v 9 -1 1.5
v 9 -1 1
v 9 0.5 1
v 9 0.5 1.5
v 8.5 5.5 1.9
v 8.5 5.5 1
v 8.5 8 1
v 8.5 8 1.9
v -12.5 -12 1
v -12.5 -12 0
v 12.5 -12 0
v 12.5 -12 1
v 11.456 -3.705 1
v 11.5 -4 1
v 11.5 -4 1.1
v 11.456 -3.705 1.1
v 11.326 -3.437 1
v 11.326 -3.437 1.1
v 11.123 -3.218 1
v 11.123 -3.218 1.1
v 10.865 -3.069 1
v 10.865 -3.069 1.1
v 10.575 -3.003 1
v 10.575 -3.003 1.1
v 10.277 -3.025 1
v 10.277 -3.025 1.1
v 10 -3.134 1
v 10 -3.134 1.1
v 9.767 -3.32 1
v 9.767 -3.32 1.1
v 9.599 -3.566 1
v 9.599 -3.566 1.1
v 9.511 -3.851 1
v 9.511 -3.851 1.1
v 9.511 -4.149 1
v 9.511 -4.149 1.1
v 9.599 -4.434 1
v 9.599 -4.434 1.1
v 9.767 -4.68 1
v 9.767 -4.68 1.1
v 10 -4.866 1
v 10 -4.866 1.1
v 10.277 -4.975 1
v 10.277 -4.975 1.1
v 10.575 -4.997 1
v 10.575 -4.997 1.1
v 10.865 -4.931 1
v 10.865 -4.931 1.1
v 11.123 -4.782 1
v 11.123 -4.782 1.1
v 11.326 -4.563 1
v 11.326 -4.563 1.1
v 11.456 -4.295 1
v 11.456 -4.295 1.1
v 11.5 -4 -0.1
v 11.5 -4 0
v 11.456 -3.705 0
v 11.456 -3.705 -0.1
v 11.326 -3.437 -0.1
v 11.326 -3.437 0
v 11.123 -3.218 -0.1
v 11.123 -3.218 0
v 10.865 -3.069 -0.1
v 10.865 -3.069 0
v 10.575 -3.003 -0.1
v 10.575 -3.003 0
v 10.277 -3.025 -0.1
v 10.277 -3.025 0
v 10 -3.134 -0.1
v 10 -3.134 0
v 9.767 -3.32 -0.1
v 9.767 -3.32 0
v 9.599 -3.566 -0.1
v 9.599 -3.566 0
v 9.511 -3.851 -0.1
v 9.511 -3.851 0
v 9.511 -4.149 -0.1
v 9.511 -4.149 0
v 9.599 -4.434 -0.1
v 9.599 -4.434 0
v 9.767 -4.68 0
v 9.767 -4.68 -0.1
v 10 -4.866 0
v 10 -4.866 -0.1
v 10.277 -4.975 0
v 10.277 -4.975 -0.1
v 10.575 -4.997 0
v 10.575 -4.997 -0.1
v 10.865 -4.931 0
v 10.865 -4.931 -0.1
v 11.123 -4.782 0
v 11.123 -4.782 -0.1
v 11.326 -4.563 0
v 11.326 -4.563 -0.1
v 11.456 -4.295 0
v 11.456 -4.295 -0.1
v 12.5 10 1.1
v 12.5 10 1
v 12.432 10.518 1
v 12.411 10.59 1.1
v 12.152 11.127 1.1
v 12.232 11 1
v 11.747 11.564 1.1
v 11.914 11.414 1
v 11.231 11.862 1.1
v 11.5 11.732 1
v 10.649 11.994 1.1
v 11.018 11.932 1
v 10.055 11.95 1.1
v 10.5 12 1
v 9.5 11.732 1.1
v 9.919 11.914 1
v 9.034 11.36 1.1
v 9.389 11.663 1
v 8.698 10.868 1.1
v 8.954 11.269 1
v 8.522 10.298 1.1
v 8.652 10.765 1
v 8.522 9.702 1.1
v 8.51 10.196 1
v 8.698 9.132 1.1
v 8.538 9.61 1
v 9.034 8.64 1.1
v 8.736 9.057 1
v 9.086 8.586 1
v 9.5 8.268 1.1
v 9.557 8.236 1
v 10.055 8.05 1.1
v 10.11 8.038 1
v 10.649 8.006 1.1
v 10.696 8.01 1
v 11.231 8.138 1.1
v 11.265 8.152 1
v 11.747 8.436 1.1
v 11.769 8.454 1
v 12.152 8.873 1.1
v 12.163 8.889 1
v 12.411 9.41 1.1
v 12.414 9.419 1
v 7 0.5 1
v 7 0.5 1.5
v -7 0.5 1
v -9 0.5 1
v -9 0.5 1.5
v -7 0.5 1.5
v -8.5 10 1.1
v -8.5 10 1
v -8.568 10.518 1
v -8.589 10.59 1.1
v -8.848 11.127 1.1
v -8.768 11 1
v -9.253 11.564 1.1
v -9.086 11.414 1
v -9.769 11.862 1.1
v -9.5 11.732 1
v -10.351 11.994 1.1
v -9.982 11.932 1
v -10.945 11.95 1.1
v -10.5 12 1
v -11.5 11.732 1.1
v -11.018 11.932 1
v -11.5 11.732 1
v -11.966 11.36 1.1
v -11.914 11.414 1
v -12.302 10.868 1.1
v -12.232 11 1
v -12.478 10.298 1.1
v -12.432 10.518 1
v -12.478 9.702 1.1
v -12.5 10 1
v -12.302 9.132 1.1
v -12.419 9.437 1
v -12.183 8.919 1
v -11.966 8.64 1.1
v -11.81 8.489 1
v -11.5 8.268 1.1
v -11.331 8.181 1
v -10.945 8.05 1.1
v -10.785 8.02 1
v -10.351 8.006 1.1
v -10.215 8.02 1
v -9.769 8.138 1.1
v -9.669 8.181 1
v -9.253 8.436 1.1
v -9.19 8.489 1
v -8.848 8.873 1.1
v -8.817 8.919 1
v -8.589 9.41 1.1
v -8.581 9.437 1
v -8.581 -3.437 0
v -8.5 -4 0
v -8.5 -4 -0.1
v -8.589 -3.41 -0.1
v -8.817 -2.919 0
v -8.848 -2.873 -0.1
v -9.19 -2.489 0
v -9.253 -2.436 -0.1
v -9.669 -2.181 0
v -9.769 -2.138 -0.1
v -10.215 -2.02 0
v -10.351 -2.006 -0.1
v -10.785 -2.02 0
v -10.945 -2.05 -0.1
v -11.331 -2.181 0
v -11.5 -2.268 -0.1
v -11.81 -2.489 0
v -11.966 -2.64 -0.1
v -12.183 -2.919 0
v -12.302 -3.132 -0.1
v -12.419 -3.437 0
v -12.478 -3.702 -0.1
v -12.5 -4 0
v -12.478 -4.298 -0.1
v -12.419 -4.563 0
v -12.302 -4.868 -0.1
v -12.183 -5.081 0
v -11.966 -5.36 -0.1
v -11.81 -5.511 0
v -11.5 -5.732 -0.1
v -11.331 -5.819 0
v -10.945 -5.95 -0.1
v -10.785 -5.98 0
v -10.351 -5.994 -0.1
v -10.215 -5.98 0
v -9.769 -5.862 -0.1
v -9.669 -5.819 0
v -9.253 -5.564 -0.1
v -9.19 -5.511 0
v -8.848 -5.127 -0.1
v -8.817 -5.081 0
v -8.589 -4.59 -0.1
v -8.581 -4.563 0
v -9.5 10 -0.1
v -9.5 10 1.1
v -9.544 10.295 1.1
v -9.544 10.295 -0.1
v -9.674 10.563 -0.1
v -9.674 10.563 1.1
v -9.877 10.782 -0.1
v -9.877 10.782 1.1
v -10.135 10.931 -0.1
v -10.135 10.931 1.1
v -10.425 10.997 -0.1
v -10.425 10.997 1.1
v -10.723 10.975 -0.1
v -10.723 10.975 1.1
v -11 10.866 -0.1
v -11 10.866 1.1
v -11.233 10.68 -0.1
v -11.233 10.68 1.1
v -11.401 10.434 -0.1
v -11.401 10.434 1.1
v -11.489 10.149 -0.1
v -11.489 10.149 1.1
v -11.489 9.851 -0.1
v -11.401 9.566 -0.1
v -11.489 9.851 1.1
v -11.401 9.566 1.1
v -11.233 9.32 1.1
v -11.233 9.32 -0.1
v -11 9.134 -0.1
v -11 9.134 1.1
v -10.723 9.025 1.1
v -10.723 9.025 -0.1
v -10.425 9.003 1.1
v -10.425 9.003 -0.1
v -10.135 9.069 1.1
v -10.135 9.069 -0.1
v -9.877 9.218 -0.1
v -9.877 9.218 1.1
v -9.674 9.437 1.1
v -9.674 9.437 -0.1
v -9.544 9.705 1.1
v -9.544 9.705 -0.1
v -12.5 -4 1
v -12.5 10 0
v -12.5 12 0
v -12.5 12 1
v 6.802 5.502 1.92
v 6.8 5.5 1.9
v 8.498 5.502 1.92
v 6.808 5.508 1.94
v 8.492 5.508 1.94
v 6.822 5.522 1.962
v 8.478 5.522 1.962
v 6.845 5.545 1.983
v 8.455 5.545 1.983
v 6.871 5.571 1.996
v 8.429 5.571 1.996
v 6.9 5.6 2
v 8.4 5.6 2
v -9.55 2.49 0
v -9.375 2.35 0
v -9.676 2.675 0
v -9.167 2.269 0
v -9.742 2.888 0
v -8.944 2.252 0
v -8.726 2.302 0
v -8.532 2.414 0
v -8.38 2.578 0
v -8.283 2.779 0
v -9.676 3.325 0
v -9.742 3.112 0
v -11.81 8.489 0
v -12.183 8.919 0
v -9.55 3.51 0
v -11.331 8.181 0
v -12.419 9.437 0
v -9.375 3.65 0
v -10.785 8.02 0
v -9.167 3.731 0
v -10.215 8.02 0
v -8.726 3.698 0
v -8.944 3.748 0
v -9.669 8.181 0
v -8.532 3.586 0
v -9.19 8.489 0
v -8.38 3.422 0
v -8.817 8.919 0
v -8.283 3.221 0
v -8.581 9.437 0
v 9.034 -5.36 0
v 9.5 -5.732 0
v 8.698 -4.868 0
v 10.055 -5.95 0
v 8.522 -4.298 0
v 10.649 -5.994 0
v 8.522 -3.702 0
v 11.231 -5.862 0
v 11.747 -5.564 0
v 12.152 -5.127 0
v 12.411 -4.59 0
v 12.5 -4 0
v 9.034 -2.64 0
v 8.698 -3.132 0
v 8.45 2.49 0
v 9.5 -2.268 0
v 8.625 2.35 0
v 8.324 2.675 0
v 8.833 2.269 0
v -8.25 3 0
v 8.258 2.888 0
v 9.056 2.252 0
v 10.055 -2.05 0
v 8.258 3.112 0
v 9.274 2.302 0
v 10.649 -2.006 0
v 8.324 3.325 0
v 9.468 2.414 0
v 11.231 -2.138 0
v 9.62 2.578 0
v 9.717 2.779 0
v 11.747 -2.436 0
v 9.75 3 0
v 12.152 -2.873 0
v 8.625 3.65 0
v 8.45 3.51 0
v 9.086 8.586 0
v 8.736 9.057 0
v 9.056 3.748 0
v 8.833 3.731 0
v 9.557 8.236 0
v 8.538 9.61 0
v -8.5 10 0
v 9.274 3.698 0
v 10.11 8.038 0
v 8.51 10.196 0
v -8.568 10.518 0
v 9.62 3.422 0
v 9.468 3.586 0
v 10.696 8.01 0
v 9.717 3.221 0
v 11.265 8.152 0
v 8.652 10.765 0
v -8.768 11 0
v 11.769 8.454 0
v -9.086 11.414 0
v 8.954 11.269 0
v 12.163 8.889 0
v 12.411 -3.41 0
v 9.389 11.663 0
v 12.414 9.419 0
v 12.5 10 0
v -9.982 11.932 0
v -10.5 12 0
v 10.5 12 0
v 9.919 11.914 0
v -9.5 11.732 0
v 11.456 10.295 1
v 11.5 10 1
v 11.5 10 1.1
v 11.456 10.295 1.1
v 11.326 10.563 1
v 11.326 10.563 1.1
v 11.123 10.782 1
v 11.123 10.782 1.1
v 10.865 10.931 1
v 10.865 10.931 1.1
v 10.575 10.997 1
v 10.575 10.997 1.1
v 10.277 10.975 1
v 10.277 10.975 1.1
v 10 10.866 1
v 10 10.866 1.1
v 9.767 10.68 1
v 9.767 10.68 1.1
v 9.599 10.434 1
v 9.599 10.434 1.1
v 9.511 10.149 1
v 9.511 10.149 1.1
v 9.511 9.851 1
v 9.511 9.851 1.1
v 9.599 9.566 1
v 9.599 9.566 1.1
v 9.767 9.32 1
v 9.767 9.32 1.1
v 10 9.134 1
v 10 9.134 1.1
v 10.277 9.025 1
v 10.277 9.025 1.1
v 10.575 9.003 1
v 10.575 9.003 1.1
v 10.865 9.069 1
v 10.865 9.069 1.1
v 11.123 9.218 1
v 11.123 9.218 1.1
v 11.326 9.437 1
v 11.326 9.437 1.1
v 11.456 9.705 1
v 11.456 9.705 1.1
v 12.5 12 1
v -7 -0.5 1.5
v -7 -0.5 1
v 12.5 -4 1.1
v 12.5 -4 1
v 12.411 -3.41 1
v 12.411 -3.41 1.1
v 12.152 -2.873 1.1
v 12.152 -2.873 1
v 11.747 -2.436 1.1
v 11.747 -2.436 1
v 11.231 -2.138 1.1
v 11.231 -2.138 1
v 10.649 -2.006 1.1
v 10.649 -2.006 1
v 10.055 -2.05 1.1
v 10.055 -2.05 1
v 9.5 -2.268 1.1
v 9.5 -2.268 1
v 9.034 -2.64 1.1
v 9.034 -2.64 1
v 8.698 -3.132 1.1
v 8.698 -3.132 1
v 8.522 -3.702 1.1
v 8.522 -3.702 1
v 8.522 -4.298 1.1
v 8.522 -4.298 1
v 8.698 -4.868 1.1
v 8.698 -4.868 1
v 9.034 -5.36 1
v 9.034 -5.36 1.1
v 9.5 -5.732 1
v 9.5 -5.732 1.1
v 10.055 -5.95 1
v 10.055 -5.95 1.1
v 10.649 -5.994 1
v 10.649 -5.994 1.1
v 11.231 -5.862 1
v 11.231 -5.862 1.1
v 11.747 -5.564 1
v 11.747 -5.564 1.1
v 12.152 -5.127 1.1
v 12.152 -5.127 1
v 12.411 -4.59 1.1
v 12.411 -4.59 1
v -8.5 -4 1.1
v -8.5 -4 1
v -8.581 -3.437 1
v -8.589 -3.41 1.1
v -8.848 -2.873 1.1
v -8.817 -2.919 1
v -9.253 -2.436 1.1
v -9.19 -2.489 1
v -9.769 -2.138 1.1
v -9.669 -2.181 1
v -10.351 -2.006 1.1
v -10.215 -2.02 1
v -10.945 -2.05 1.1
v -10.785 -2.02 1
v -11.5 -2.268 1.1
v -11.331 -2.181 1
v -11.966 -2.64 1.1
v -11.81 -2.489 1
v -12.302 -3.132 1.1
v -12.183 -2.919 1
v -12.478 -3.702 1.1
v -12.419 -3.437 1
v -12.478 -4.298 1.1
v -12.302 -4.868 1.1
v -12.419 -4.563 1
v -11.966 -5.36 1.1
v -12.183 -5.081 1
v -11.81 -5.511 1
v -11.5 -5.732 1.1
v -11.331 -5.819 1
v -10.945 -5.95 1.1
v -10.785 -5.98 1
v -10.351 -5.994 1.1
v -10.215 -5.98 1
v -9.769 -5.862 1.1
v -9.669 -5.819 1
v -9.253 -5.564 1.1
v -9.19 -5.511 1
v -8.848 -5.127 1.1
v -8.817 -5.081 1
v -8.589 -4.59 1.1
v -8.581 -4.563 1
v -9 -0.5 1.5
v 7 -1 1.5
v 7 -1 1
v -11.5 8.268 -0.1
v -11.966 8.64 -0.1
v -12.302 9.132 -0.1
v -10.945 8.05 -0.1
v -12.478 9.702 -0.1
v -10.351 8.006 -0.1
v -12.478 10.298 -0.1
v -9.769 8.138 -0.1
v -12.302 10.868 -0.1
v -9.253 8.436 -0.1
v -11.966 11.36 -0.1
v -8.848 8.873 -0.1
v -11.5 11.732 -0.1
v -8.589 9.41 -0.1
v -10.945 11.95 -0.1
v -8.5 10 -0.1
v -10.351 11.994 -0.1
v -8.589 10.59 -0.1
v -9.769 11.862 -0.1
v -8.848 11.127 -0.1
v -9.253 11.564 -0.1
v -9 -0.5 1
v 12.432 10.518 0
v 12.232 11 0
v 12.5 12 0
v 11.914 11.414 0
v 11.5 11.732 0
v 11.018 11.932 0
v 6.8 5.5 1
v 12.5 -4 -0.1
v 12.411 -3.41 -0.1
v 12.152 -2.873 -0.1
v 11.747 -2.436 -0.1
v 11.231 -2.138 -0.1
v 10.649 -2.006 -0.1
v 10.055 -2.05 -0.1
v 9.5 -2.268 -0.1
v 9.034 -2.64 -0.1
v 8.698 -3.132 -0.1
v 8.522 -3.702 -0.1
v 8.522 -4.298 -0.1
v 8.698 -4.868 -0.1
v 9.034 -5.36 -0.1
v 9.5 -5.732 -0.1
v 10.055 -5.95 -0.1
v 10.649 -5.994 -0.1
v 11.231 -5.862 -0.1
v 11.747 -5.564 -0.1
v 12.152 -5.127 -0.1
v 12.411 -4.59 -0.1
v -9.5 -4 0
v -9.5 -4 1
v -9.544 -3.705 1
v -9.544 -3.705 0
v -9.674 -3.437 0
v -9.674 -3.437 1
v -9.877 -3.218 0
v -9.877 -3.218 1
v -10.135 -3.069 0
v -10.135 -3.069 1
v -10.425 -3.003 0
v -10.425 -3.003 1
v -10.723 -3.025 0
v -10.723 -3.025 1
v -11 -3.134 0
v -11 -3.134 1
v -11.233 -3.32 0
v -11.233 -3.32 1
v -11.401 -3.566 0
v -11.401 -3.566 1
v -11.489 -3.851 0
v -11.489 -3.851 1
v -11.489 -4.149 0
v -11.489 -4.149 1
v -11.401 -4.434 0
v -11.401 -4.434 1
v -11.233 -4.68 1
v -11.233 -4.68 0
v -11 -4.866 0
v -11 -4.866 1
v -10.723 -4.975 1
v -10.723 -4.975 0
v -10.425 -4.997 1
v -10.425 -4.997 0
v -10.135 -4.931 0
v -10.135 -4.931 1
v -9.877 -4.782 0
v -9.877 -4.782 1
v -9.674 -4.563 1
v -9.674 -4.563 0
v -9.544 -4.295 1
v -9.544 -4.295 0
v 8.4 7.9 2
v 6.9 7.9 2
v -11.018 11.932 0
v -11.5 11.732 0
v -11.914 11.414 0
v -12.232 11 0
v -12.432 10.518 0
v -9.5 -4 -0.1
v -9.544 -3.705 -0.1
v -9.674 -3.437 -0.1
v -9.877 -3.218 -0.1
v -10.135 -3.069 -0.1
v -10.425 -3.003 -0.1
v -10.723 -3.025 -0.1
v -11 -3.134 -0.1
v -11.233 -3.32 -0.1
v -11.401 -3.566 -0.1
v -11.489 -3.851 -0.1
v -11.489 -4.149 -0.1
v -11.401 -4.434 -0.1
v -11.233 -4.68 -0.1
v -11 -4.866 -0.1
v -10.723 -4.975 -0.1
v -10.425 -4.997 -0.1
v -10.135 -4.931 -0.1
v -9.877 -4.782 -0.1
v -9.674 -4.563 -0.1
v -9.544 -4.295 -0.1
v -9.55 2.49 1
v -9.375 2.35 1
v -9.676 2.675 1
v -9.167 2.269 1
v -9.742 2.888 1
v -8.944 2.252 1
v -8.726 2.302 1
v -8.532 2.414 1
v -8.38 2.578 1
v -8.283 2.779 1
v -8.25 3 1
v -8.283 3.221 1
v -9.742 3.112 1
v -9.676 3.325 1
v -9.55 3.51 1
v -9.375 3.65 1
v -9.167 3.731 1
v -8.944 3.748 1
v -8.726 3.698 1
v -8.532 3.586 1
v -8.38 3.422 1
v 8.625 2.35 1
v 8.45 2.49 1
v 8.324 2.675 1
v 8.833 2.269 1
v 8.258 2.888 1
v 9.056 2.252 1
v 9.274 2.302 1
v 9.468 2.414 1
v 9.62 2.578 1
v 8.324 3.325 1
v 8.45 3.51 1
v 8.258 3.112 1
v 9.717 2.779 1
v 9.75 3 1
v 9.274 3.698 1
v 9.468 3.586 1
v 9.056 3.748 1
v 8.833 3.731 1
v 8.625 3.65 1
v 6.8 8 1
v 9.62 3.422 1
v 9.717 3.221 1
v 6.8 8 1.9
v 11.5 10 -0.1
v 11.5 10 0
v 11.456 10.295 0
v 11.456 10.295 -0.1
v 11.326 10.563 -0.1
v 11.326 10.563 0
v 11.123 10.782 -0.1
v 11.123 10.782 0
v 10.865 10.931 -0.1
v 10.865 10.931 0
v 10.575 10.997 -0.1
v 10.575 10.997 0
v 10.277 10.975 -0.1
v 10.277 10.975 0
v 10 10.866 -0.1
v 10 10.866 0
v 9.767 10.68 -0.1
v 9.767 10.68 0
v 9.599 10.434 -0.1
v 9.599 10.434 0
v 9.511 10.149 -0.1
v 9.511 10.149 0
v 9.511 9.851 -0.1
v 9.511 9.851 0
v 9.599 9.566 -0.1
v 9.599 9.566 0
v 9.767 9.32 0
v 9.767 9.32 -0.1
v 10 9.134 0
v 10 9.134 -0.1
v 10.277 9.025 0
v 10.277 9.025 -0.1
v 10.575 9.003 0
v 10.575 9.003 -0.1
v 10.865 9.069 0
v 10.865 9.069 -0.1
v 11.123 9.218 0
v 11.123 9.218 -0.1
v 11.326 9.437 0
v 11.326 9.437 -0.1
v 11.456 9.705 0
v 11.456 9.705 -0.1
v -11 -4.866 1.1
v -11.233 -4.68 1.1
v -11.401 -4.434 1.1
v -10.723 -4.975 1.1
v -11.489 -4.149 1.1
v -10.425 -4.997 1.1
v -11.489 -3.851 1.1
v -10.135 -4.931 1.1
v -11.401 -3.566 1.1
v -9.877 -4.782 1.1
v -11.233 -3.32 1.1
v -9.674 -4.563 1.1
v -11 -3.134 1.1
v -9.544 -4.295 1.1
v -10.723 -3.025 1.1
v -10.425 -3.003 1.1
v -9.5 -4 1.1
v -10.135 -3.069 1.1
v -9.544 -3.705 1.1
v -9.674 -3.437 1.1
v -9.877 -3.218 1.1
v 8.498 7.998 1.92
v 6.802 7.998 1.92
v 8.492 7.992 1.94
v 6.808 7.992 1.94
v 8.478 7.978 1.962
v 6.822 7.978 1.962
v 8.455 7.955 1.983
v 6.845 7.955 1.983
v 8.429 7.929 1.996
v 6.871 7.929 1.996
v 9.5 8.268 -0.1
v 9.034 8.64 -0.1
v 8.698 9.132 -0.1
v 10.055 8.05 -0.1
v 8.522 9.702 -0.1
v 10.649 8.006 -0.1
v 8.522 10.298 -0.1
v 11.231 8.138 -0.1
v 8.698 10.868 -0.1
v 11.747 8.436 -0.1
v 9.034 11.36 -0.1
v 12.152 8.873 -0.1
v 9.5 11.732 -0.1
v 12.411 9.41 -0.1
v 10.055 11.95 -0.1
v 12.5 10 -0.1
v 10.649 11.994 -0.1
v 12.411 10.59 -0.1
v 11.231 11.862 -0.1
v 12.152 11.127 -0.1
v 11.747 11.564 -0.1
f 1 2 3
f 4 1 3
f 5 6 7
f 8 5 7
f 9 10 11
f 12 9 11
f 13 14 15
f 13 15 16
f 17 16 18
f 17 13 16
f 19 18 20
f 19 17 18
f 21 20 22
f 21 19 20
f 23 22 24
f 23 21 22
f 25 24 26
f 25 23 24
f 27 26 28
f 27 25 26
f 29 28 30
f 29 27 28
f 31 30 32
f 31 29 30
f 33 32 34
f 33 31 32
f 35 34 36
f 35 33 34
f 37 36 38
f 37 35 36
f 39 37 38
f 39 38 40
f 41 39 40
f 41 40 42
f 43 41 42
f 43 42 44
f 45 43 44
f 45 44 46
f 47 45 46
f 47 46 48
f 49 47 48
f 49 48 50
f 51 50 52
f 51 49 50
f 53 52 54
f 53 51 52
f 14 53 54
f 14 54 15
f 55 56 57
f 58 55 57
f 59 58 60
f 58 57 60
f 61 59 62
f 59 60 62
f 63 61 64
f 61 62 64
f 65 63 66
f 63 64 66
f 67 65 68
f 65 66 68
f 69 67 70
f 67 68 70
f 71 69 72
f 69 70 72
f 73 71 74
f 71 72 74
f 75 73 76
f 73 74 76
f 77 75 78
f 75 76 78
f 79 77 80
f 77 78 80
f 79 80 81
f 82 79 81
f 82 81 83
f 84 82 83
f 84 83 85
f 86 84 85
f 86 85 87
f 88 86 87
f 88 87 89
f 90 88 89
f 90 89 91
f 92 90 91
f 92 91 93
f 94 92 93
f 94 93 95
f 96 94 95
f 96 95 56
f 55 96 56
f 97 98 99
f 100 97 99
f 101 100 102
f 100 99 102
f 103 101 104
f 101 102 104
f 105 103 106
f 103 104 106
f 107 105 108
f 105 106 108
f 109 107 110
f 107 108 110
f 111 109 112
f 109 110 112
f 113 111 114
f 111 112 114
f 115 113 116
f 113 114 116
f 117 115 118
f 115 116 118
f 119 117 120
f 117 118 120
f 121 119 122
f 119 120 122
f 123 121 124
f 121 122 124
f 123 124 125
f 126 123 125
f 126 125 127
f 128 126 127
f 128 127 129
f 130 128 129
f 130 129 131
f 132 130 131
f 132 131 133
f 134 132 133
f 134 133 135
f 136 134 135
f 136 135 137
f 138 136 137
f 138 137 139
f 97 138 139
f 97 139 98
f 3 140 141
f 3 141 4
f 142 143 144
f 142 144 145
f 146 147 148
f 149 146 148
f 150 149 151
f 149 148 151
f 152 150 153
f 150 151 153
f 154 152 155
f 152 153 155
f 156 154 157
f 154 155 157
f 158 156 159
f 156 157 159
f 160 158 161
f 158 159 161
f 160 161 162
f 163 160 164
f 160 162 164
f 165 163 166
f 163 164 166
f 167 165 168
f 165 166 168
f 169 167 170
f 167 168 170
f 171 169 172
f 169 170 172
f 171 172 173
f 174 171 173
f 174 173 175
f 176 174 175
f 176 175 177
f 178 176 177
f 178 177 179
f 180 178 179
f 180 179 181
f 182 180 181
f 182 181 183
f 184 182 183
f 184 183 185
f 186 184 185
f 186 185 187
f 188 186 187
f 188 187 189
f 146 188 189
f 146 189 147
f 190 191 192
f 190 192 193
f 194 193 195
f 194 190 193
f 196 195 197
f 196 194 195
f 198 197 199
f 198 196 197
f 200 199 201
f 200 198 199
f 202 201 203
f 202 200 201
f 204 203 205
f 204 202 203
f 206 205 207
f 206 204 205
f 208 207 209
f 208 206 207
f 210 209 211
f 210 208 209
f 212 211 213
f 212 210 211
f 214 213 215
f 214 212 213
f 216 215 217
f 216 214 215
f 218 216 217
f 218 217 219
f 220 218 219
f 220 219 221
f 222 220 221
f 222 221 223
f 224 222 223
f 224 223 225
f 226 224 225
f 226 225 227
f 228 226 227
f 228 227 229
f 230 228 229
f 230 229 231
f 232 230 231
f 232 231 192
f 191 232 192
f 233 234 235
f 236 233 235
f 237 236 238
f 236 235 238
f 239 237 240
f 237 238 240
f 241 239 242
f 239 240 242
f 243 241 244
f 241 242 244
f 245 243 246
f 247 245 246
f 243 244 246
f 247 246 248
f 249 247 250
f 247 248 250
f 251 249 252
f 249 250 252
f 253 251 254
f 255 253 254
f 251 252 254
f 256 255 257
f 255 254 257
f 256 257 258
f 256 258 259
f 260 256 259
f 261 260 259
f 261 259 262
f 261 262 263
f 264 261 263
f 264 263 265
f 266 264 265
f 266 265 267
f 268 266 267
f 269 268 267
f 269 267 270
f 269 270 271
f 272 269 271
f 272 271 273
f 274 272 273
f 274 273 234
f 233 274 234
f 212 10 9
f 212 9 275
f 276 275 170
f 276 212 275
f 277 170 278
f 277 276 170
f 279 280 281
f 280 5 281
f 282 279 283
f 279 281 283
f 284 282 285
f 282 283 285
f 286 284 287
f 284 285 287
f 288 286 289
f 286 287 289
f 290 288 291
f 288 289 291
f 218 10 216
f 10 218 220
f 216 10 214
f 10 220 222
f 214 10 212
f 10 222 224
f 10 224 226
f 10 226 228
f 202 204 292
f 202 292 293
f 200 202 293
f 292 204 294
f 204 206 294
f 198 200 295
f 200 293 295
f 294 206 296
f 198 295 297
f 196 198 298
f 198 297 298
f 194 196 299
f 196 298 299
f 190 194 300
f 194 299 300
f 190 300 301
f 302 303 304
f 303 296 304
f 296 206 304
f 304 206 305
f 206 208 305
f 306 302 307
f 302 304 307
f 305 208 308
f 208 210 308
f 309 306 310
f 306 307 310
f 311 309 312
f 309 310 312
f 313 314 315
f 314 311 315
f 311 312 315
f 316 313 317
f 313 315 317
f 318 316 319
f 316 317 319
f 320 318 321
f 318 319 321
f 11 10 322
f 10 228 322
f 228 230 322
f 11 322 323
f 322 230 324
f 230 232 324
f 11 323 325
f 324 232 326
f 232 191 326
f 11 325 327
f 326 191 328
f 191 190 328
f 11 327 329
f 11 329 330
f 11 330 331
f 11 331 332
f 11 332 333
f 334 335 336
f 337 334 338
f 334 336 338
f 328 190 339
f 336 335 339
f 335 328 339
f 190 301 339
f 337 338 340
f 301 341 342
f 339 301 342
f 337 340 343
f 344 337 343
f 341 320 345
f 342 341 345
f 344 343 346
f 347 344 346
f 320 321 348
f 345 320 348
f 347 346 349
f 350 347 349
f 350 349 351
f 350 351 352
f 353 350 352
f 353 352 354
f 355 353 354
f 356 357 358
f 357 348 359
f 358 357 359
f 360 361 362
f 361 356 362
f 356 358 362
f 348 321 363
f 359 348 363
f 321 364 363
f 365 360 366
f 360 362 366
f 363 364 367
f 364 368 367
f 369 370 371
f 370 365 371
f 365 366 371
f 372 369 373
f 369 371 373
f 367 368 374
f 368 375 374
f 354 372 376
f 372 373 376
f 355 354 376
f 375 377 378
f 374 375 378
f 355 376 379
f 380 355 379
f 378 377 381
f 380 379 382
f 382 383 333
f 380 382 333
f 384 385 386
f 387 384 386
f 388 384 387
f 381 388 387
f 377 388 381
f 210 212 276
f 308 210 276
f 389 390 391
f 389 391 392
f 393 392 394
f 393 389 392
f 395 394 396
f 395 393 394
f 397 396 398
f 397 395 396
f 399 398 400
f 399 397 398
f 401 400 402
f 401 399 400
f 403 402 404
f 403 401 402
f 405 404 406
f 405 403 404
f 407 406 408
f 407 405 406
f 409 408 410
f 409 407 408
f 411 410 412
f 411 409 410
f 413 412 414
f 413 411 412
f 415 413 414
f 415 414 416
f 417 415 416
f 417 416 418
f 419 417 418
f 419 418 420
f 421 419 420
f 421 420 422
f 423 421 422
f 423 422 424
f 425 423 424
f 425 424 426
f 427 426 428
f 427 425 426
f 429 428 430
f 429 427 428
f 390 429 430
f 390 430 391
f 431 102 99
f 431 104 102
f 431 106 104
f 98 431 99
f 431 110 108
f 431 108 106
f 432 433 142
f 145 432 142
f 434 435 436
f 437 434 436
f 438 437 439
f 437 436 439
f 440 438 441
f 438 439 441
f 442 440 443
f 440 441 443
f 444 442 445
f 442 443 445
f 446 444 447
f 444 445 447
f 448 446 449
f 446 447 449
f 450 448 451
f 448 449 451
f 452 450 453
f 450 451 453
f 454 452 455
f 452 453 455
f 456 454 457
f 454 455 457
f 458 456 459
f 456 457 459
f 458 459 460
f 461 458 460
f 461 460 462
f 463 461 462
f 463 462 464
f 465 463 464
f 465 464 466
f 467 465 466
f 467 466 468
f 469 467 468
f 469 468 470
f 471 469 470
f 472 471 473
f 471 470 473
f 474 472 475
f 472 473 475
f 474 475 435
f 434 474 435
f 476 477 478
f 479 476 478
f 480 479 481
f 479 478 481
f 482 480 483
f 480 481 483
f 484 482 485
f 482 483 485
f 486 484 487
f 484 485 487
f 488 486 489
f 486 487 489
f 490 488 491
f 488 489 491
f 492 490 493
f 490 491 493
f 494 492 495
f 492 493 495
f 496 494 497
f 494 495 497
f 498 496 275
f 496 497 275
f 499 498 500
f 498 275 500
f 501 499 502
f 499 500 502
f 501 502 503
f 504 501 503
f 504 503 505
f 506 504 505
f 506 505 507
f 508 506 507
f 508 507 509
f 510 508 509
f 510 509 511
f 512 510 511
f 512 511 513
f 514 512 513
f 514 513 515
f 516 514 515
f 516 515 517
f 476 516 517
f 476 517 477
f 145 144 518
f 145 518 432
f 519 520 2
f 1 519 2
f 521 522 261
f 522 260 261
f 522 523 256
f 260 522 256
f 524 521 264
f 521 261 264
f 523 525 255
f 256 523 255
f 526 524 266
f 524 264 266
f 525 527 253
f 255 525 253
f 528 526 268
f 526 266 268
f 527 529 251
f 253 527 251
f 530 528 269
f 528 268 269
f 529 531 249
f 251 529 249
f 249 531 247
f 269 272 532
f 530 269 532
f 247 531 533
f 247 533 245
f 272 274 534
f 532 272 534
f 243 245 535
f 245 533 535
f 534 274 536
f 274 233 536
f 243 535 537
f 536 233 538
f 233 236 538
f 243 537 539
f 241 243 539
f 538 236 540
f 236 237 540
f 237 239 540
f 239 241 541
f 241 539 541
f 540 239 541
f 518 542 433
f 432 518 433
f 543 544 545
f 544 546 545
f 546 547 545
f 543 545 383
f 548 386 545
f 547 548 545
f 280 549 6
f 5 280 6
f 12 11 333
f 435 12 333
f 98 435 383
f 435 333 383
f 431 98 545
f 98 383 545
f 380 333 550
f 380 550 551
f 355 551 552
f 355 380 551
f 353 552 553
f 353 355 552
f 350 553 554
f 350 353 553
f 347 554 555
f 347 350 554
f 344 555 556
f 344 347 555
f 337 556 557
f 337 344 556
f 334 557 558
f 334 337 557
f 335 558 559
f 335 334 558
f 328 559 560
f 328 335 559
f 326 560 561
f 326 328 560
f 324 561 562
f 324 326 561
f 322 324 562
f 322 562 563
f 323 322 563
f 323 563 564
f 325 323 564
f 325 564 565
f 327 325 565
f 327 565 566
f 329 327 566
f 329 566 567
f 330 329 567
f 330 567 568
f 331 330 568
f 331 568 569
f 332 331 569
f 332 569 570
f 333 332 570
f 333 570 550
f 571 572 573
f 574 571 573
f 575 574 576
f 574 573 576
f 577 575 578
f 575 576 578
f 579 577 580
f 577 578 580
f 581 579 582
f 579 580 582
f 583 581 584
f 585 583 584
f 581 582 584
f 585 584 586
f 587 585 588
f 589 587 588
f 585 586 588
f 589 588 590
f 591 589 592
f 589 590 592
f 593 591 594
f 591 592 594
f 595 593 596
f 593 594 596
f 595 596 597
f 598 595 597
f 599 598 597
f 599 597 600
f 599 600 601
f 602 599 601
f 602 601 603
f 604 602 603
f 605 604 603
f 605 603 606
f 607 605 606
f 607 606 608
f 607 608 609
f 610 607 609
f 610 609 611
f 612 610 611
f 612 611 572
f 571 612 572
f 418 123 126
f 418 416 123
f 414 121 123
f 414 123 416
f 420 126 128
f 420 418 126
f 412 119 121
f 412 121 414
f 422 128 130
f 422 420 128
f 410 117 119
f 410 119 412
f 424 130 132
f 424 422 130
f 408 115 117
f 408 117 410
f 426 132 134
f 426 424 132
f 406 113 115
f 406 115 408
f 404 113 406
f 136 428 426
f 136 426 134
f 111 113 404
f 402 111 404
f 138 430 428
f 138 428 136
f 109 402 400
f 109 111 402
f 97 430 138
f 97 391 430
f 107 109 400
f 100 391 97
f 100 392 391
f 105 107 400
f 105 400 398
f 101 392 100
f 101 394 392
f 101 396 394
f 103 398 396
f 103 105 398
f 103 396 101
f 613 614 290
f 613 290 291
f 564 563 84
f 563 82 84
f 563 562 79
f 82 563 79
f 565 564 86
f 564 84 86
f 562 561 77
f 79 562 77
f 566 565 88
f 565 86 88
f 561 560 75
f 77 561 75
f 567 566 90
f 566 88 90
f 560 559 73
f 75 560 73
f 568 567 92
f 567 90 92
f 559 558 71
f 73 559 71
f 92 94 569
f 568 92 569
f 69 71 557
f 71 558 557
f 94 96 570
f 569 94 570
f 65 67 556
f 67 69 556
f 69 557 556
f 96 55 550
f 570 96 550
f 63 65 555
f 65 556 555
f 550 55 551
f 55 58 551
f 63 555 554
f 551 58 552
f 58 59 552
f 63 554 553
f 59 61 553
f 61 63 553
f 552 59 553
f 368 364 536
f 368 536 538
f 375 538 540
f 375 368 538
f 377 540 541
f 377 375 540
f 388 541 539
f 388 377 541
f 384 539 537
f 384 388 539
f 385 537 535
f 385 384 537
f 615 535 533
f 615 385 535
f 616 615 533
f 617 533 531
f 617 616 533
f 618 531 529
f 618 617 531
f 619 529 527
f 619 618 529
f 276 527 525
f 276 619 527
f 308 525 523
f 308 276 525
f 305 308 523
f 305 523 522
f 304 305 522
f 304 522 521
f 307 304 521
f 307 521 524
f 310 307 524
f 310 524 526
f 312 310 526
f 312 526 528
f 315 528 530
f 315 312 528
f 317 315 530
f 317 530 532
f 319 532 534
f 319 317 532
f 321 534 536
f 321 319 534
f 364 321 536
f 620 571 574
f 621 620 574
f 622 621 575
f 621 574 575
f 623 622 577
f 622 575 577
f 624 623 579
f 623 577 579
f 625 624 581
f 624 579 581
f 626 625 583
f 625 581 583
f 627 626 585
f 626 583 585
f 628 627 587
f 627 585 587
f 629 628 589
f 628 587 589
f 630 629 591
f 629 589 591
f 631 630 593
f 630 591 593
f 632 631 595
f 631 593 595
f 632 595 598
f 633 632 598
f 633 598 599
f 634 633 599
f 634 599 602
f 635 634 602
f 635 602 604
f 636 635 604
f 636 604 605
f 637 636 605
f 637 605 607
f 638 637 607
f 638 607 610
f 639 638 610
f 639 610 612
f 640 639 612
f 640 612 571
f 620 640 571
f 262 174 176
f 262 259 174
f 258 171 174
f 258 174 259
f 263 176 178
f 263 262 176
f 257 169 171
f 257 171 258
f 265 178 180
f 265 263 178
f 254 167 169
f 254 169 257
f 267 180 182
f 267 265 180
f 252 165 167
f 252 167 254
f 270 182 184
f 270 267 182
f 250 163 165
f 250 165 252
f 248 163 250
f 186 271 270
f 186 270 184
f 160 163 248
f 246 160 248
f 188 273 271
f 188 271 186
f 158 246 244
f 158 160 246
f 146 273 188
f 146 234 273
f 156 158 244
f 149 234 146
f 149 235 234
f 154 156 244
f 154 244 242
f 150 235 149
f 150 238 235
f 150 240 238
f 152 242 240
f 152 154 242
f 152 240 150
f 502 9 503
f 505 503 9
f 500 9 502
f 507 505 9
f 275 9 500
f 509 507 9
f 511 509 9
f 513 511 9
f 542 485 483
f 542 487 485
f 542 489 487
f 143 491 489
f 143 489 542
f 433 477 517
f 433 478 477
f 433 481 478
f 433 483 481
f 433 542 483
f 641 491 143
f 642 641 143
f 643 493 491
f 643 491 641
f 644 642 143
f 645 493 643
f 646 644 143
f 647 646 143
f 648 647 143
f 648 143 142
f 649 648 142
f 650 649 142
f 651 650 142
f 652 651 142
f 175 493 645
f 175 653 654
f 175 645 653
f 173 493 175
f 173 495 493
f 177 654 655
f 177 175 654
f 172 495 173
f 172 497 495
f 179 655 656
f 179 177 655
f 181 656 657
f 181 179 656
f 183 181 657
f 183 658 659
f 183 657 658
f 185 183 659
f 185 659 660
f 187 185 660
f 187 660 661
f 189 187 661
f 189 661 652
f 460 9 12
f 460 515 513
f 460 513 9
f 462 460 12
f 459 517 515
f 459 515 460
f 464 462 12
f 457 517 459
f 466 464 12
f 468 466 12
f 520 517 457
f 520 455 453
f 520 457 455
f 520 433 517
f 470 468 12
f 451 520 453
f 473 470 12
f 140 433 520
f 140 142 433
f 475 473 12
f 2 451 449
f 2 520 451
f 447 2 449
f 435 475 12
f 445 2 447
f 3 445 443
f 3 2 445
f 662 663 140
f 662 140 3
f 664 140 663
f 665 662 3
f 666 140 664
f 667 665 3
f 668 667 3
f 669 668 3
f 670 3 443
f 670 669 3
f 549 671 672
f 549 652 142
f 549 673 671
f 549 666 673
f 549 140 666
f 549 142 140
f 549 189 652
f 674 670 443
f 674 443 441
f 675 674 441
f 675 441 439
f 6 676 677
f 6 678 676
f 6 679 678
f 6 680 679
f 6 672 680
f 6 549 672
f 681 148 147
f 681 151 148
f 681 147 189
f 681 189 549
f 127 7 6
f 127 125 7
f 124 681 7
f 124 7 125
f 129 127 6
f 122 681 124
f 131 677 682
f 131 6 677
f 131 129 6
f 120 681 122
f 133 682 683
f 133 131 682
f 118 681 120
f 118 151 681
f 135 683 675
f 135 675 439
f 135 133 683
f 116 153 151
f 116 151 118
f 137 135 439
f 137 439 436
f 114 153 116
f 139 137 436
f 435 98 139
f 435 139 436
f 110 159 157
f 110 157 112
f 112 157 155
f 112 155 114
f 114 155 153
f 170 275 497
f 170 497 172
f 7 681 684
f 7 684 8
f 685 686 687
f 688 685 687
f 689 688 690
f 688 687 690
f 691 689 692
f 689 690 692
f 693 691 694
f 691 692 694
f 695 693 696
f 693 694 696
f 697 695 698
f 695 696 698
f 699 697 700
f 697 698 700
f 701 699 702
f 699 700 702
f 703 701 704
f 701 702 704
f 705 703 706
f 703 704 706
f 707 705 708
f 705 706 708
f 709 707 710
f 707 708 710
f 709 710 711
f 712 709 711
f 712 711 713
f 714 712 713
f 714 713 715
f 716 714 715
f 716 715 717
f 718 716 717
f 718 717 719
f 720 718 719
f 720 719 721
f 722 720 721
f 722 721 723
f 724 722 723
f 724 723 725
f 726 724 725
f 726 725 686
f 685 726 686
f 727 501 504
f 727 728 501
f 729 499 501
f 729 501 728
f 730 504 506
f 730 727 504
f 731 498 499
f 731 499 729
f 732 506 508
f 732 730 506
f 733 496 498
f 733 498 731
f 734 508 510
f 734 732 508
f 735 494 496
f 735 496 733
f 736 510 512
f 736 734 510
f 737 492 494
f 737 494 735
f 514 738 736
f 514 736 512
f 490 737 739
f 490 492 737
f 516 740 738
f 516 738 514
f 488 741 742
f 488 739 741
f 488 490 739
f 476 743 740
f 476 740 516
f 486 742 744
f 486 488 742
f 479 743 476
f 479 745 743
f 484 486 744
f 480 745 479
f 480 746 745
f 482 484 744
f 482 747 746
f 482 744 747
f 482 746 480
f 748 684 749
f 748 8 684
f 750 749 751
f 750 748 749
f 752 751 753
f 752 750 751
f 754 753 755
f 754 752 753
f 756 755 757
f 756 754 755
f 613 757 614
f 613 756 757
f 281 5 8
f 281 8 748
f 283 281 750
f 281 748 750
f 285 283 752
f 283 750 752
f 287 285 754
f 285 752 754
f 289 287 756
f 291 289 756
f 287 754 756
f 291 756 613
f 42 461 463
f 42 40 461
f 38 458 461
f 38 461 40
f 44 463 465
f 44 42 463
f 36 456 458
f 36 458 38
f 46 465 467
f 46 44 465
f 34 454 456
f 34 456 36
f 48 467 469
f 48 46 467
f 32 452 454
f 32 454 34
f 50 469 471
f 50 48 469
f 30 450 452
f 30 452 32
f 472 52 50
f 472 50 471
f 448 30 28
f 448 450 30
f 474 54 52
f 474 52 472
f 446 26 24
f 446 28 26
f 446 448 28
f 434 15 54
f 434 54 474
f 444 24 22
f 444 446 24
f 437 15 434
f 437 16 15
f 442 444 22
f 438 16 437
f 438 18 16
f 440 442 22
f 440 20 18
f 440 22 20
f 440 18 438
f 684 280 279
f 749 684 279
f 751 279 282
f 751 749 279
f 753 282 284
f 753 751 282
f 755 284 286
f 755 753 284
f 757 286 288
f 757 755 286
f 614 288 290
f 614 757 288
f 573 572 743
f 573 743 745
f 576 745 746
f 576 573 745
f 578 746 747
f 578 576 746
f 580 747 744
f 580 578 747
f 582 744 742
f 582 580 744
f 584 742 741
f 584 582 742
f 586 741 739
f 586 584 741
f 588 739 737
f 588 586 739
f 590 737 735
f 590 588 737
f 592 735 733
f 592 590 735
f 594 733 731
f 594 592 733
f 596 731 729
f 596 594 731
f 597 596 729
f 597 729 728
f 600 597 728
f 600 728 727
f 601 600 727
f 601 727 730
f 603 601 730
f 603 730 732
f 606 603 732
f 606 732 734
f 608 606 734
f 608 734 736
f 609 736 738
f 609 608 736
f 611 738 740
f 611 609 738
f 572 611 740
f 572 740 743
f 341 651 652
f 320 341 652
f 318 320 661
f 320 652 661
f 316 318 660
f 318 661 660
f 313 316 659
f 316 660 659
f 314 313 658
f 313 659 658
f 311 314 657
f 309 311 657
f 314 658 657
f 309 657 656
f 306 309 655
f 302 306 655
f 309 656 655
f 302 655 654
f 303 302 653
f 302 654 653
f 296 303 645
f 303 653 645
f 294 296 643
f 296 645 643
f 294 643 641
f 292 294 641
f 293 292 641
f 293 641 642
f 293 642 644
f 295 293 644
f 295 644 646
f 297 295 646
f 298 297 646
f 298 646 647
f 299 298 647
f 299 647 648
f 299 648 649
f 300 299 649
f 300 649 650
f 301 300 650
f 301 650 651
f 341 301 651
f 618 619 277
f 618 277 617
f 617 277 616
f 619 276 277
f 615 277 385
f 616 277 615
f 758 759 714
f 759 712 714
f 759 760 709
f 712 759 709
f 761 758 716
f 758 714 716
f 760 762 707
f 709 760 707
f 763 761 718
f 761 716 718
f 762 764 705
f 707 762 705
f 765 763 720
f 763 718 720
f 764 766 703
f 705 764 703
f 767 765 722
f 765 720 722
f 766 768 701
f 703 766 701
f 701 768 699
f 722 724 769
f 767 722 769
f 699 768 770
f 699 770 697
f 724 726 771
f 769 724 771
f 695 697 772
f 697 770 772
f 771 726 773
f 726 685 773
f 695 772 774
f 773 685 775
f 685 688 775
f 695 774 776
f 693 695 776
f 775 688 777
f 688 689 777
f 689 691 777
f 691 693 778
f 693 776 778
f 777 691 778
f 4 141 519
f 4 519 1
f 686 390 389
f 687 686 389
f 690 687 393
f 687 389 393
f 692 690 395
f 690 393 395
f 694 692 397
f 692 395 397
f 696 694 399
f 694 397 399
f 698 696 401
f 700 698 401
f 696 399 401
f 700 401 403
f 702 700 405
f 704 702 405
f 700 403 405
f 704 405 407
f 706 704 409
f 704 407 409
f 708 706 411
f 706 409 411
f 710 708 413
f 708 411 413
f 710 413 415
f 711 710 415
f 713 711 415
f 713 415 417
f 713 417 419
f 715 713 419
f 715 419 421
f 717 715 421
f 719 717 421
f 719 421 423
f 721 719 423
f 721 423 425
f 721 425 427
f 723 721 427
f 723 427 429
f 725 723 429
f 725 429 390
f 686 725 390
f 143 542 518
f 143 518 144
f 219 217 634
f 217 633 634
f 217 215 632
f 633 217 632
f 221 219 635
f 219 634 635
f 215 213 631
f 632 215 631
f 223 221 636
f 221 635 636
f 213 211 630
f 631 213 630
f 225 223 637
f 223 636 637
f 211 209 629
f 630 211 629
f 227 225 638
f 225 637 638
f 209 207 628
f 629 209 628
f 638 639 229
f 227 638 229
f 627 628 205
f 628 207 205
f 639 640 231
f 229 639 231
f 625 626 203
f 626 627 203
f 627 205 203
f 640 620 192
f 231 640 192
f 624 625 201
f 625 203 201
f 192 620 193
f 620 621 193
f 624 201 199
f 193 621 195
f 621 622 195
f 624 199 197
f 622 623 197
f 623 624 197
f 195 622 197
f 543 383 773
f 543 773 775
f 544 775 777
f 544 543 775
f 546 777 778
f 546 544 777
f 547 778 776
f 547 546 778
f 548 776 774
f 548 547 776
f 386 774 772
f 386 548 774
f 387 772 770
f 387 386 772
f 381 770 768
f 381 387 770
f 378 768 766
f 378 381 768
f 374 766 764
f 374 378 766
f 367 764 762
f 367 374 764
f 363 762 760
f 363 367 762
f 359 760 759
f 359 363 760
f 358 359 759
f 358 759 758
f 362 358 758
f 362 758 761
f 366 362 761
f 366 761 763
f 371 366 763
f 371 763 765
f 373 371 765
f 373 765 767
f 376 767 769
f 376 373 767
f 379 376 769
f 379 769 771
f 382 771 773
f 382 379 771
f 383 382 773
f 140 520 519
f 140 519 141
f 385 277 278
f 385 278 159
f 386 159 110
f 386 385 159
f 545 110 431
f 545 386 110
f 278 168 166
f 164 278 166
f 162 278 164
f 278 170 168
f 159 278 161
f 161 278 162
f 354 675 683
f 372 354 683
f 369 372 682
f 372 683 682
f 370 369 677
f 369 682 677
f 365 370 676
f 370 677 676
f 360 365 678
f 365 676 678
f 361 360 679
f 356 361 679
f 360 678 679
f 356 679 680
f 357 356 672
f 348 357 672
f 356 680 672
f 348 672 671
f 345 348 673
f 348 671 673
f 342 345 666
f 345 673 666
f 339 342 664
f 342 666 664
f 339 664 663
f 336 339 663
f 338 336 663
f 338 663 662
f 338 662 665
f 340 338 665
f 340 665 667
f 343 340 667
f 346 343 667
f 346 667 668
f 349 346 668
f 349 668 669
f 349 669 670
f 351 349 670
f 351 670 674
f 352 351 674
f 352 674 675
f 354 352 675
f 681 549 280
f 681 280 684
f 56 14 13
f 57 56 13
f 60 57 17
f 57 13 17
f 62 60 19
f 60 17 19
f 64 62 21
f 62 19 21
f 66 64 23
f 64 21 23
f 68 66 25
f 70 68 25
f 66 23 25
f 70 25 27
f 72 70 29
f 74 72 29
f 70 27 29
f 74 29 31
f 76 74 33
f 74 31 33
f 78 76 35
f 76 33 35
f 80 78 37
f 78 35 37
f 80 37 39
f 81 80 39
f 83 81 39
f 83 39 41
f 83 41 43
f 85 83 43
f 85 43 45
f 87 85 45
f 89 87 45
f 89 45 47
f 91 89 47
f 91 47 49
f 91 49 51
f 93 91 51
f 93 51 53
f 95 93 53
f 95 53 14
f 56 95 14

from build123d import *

# Parameters (mm, degrees)
SKETCH1_W                = 25
SKETCH1_H                = 24
BOSS_EXTRUDE1_DEPTH      = 1
SKETCH2_R                = 1
SKETCH2_R_2              = 0.75
CUT_EXTRUDE1_DEPTH       = 2
SKETCH3_R                = 2
SKETCH3_R_2              = 1
BOSS_EXTRUDE3_DEPTH      = 0.1
BOSS_EXTRUDE3_DEPTH_BACK = 1.1
SKETCH4_W                = 1.7
SKETCH4_H                = 2.5
BOSS_EXTRUDE4_DEPTH      = 1
FILLET1_R                = 0.1
SKETCH5_W                = 2
SKETCH5_H                = 1
SKETCH5_H_2              = 1.5
BOSS_EXTRUDE5_DEPTH      = 0.5


with BuildPart() as part:
    # Sketch1 → Boss-Extrude1 (new body)
    with BuildSketch(Plane.XY):
        Rectangle(SKETCH1_W, SKETCH1_H)
    extrude(amount=BOSS_EXTRUDE1_DEPTH)

    # Sketch2 → Cut-Extrude1 (cut)
    with BuildSketch(Plane.XY.offset(1)):
        with Locations((-10.5, 10)):
            Circle(SKETCH2_R)
        with Locations((10.5, 10)):
            Circle(SKETCH2_R)
        with Locations((10.5, -4)):
            Circle(SKETCH2_R)
        with Locations((-10.5, -4)):
            Circle(SKETCH2_R)
        with Locations((-9, 3)):
            Circle(SKETCH2_R_2)
        with Locations((9, 3)):
            Circle(SKETCH2_R_2)
    extrude(amount=-CUT_EXTRUDE1_DEPTH, mode=Mode.SUBTRACT)

    # Sketch3 → Boss-Extrude3 (add, two sides)
    with BuildSketch(Plane.XY.offset(1)) as boss_extrude3_sk:
        with Locations((-10.5, 10)):
            Circle(SKETCH3_R)
        with Locations((-10.5, 10)):
            Circle(SKETCH3_R_2, mode=Mode.SUBTRACT)
        with Locations((10.5, 10)):
            Circle(SKETCH3_R)
        with Locations((10.5, 10)):
            Circle(SKETCH3_R_2, mode=Mode.SUBTRACT)
        with Locations((10.5, -4)):
            Circle(SKETCH3_R)
        with Locations((10.5, -4)):
            Circle(SKETCH3_R_2, mode=Mode.SUBTRACT)
        with Locations((-10.5, -4)):
            Circle(SKETCH3_R)
        with Locations((-10.5, -4)):
            Circle(SKETCH3_R_2, mode=Mode.SUBTRACT)
    extrude(amount=BOSS_EXTRUDE3_DEPTH)
    extrude(boss_extrude3_sk.sketch, amount=-BOSS_EXTRUDE3_DEPTH_BACK)

    # Sketch4 → Boss-Extrude4 (add)
    with BuildSketch(Plane.XY.offset(1)):
        with Locations((7.65, 6.75)):
            Rectangle(SKETCH4_W, SKETCH4_H)
    extrude(amount=BOSS_EXTRUDE4_DEPTH)

    # Fillet1
    fillet1_edges = [part.edges().sort_by_distance(p)[0] for p in [
        (8.5, 6.75, 2),
        (7.65, 8, 2),
        (6.8, 6.75, 2),
        (7.65, 5.5, 2),
    ]]
    fillet(fillet1_edges, radius=FILLET1_R)

    # Sketch5 → Boss-Extrude5 (add)
    with BuildSketch(Plane.XY.offset(1)):
        with Locations((-8, 0)):
            Rectangle(SKETCH5_W, SKETCH5_H)
        with Locations((8, -0.25)):
            Rectangle(SKETCH5_W, SKETCH5_H_2)
    extrude(amount=BOSS_EXTRUDE5_DEPTH)


solid = part.part
